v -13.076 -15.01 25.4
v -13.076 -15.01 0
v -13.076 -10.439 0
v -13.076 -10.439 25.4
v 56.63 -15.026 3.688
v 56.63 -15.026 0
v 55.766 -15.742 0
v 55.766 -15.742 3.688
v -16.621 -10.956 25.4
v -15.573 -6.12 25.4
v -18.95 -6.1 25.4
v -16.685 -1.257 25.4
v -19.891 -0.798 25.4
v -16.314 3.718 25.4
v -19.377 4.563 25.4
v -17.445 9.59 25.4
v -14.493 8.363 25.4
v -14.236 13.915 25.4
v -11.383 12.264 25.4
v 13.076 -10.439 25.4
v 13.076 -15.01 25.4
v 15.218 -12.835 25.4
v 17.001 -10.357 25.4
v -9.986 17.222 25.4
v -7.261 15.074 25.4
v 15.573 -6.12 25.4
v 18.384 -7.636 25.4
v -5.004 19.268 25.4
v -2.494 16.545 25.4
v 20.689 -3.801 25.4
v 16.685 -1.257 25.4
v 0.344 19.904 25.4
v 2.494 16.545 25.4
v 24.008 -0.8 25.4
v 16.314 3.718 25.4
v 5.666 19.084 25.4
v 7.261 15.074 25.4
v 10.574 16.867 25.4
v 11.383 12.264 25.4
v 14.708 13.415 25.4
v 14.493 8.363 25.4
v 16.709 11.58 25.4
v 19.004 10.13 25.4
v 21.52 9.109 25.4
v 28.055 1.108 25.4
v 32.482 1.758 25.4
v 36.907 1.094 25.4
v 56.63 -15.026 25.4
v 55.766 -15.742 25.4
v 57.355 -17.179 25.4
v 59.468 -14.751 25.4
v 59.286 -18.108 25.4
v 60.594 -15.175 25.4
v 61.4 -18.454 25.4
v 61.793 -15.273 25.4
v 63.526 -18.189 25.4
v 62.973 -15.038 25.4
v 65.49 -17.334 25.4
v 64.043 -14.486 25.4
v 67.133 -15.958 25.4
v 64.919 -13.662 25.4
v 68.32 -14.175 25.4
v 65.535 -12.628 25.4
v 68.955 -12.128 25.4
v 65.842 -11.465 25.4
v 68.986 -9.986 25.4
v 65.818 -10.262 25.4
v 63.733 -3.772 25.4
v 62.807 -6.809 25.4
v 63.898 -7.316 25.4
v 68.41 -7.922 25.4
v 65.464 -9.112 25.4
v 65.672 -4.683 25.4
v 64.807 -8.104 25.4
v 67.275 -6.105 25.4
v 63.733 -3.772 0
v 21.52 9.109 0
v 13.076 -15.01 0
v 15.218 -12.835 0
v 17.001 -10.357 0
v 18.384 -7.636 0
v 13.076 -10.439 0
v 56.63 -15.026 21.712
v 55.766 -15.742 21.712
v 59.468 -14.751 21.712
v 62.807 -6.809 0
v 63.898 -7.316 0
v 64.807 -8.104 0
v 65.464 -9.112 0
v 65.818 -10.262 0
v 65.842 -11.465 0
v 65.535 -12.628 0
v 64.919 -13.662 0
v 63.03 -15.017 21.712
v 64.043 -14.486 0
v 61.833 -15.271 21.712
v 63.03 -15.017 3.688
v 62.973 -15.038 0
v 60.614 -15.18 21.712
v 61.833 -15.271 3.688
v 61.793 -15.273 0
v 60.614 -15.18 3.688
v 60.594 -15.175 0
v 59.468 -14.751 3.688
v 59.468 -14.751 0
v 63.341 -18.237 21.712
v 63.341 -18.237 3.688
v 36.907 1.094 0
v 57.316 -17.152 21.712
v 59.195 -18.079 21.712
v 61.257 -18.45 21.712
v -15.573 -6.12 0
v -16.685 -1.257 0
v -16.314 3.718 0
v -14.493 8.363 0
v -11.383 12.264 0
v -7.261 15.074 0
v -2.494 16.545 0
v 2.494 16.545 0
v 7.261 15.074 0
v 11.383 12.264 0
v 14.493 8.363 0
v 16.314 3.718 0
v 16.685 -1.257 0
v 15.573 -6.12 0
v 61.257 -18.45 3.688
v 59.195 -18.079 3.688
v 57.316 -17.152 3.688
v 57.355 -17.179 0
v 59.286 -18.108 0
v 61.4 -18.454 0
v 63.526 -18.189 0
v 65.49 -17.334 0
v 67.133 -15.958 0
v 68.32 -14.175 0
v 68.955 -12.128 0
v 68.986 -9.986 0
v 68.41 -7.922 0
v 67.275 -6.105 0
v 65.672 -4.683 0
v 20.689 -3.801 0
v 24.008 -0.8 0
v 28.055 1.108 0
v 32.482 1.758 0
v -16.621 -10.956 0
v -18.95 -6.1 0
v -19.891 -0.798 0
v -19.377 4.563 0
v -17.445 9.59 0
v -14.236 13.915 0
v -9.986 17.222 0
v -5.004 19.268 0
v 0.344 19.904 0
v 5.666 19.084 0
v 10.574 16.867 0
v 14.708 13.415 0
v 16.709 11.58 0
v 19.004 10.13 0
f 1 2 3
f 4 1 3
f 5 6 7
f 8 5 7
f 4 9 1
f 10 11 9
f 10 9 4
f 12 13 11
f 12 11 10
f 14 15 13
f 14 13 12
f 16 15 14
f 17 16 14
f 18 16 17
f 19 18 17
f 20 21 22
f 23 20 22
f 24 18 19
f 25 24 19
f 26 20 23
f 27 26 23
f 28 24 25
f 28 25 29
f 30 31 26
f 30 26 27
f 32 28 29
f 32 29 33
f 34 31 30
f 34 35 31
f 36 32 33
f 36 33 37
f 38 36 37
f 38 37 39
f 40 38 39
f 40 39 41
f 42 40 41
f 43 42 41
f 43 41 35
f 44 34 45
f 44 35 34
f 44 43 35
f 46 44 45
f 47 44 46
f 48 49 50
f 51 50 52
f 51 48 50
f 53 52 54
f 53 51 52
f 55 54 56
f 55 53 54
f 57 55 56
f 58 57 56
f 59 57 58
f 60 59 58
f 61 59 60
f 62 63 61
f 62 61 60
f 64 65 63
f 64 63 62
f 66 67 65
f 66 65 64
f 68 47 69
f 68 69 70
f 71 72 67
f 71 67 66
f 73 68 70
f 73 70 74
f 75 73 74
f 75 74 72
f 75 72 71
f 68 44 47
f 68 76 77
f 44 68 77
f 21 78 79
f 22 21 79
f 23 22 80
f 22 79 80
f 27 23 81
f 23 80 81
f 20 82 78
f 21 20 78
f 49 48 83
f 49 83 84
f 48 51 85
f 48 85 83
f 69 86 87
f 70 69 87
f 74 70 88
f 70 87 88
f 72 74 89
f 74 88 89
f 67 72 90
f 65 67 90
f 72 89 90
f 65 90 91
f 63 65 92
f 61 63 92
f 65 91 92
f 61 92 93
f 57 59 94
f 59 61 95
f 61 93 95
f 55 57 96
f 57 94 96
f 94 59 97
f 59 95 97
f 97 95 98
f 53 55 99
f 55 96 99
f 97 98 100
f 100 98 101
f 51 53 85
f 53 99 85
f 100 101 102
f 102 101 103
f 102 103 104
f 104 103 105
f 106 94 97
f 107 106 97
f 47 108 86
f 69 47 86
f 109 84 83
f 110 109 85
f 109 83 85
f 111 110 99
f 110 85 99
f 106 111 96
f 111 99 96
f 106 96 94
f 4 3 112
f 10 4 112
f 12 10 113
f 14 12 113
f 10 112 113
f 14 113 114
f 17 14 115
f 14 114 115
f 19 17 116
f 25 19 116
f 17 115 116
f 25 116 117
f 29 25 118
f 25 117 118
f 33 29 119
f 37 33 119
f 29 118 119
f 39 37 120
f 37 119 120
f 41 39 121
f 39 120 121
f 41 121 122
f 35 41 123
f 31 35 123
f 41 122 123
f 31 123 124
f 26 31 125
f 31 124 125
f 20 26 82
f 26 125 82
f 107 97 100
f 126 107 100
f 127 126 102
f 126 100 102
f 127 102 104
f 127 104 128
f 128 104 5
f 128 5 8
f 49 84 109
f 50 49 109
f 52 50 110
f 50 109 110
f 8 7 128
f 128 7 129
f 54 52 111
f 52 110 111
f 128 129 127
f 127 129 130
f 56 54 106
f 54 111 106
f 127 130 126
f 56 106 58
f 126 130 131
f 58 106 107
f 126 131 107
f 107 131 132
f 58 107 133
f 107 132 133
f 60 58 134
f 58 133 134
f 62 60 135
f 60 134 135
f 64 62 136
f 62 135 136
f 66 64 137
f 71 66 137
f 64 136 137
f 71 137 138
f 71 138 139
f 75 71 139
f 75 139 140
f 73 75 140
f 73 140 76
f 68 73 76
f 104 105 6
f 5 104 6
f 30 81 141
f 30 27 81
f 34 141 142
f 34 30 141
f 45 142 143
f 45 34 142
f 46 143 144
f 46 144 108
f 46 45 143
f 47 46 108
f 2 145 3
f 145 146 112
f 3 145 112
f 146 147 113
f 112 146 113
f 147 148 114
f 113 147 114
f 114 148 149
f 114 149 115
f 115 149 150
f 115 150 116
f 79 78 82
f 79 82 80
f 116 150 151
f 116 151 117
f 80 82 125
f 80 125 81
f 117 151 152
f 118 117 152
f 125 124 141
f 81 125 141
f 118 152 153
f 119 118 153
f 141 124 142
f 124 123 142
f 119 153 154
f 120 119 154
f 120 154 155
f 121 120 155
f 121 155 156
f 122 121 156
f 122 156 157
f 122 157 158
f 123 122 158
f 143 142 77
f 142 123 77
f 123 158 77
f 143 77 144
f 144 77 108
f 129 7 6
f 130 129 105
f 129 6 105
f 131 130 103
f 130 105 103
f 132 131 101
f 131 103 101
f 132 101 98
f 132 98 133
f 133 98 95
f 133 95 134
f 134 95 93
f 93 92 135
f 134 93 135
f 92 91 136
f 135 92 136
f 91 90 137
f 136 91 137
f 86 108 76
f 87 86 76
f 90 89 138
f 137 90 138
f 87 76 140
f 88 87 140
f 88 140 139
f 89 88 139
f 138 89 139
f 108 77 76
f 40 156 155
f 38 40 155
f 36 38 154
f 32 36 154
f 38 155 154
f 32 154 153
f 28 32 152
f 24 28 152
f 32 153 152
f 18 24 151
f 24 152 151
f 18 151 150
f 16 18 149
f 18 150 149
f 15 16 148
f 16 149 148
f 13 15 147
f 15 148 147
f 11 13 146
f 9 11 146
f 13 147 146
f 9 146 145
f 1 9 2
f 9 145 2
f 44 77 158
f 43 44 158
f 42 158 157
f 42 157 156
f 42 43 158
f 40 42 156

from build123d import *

# Parameters (mm, degrees)
F1_DEPTH    = 25.4
F2_R        = 15.24
F3_T1_DEPTH = 36.0903109365
F4_W        = 3.5194646057
F4_H        = 9.0122472823
F4_W_2      = 2.8517952656
F4_W_3      = 4.2412726252
F5_DEPTH    = 25.4


# Not quite as in the source:
# - a fillet or chamfer that OpenCascade refuses, or shapes differently, is made with other operations: its cross-section is extruded or revolved along the edge and cut away or added


with BuildPart() as f1:
    # F0 (on Top) → F1 (new body)
    with BuildSketch(Plane.XY):
        with BuildLine():
            ThreePointArc((-13.0763784004, -10.4391818642), (0, 16.73225), (13.0763784004, -10.4391818642))
            Line((13.0763784004, -10.4391818642), (13.0763784004, -15.0102275297))
            ThreePointArc((13.0763784004, -15.0102275297), (19.2516474294, -5.0668208785), (18.7713860197, 6.6282478426))
            Line((18.7713860197, 6.6282478426), (62.8066707781, -6.8086651928))
            ThreePointArc((62.8066707781, -6.8086651928), (65.147620689, -13.3496506564), (58.2099580532, -13.7148553544))
            Line((58.2099580532, -13.7148553544), (55.7661979944, -15.7418387719))
            ThreePointArc((55.7661979944, -15.7418387719), (67.7906892269, -15.1088589169), (63.7333095074, -3.7718962412))
            Line((63.7333095074, -3.7718962412), (16.9015827692, 10.5183222263))
            ThreePointArc((16.9015827692, 10.5183222263), (-12.9067718767, 15.1563136113), (-13.0763784004, -15.0102275297))
            Line((-13.0763784004, -15.0102275297), (-13.0763784004, -10.4391818642))
        make_face()
    extrude(amount=F1_DEPTH)

    # F2
    f2_edges = [f1.edges().sort_by_distance(p)[0] for p in [
        (16.901583, 10.518322, 12.7),
        (18.771386, 6.628248, 12.7),
    ]]
    fillet(f2_edges, radius=F2_R)

    # F3: chamfer of 2.54 on 1 edges, made by hand

    # F3_s2 → F3_t1 (cut)
    with BuildSketch(Plane.XY.offset(-5.3451554683)):
        with BuildLine():
            Line((59.4681740413, -14.7511998168), (56.6296179231, -15.0256727671))
            Line((56.6296179231, -15.0256727671), (58.2099580532, -13.7148553544))
            ThreePointArc((58.2099580532, -13.7148553544), (58.8184317915, -14.3160957873), (59.4681740413, -14.7511998168))
        make_face()
    extrude(amount=F3_T1_DEPTH, mode=Mode.SUBTRACT)

    # F4 (on face) → F5 (cut)
    with BuildSketch(Plane(origin=(1.9640154801, -20.3115394411, 0), x_dir=(-0.9953576095, -0.0962456715, 0), z_dir=(-0.0962456715, 0.9953576095, 0))):
        with Locations((-59.5320927234, 8.1938763589)):
            Rectangle(F4_W, F4_H)
        with Locations((-59.5320927234, 17.2061236411)):
            Rectangle(F4_W, F4_H)
        with Locations((-56.3464627878, 17.2061236411)):
            Rectangle(F4_W_2, F4_H)
        with Locations((-56.3464627878, 8.1938763589)):
            Rectangle(F4_W_2, F4_H)
        with Locations((-52.7999288424, 8.1938763589)):
            Rectangle(F4_W_3, F4_H)
        with Locations((-52.7999288424, 17.2061236411)):
            Rectangle(F4_W_3, F4_H)
    extrude(amount=-F5_DEPTH, mode=Mode.SUBTRACT)


solid = f1.part
